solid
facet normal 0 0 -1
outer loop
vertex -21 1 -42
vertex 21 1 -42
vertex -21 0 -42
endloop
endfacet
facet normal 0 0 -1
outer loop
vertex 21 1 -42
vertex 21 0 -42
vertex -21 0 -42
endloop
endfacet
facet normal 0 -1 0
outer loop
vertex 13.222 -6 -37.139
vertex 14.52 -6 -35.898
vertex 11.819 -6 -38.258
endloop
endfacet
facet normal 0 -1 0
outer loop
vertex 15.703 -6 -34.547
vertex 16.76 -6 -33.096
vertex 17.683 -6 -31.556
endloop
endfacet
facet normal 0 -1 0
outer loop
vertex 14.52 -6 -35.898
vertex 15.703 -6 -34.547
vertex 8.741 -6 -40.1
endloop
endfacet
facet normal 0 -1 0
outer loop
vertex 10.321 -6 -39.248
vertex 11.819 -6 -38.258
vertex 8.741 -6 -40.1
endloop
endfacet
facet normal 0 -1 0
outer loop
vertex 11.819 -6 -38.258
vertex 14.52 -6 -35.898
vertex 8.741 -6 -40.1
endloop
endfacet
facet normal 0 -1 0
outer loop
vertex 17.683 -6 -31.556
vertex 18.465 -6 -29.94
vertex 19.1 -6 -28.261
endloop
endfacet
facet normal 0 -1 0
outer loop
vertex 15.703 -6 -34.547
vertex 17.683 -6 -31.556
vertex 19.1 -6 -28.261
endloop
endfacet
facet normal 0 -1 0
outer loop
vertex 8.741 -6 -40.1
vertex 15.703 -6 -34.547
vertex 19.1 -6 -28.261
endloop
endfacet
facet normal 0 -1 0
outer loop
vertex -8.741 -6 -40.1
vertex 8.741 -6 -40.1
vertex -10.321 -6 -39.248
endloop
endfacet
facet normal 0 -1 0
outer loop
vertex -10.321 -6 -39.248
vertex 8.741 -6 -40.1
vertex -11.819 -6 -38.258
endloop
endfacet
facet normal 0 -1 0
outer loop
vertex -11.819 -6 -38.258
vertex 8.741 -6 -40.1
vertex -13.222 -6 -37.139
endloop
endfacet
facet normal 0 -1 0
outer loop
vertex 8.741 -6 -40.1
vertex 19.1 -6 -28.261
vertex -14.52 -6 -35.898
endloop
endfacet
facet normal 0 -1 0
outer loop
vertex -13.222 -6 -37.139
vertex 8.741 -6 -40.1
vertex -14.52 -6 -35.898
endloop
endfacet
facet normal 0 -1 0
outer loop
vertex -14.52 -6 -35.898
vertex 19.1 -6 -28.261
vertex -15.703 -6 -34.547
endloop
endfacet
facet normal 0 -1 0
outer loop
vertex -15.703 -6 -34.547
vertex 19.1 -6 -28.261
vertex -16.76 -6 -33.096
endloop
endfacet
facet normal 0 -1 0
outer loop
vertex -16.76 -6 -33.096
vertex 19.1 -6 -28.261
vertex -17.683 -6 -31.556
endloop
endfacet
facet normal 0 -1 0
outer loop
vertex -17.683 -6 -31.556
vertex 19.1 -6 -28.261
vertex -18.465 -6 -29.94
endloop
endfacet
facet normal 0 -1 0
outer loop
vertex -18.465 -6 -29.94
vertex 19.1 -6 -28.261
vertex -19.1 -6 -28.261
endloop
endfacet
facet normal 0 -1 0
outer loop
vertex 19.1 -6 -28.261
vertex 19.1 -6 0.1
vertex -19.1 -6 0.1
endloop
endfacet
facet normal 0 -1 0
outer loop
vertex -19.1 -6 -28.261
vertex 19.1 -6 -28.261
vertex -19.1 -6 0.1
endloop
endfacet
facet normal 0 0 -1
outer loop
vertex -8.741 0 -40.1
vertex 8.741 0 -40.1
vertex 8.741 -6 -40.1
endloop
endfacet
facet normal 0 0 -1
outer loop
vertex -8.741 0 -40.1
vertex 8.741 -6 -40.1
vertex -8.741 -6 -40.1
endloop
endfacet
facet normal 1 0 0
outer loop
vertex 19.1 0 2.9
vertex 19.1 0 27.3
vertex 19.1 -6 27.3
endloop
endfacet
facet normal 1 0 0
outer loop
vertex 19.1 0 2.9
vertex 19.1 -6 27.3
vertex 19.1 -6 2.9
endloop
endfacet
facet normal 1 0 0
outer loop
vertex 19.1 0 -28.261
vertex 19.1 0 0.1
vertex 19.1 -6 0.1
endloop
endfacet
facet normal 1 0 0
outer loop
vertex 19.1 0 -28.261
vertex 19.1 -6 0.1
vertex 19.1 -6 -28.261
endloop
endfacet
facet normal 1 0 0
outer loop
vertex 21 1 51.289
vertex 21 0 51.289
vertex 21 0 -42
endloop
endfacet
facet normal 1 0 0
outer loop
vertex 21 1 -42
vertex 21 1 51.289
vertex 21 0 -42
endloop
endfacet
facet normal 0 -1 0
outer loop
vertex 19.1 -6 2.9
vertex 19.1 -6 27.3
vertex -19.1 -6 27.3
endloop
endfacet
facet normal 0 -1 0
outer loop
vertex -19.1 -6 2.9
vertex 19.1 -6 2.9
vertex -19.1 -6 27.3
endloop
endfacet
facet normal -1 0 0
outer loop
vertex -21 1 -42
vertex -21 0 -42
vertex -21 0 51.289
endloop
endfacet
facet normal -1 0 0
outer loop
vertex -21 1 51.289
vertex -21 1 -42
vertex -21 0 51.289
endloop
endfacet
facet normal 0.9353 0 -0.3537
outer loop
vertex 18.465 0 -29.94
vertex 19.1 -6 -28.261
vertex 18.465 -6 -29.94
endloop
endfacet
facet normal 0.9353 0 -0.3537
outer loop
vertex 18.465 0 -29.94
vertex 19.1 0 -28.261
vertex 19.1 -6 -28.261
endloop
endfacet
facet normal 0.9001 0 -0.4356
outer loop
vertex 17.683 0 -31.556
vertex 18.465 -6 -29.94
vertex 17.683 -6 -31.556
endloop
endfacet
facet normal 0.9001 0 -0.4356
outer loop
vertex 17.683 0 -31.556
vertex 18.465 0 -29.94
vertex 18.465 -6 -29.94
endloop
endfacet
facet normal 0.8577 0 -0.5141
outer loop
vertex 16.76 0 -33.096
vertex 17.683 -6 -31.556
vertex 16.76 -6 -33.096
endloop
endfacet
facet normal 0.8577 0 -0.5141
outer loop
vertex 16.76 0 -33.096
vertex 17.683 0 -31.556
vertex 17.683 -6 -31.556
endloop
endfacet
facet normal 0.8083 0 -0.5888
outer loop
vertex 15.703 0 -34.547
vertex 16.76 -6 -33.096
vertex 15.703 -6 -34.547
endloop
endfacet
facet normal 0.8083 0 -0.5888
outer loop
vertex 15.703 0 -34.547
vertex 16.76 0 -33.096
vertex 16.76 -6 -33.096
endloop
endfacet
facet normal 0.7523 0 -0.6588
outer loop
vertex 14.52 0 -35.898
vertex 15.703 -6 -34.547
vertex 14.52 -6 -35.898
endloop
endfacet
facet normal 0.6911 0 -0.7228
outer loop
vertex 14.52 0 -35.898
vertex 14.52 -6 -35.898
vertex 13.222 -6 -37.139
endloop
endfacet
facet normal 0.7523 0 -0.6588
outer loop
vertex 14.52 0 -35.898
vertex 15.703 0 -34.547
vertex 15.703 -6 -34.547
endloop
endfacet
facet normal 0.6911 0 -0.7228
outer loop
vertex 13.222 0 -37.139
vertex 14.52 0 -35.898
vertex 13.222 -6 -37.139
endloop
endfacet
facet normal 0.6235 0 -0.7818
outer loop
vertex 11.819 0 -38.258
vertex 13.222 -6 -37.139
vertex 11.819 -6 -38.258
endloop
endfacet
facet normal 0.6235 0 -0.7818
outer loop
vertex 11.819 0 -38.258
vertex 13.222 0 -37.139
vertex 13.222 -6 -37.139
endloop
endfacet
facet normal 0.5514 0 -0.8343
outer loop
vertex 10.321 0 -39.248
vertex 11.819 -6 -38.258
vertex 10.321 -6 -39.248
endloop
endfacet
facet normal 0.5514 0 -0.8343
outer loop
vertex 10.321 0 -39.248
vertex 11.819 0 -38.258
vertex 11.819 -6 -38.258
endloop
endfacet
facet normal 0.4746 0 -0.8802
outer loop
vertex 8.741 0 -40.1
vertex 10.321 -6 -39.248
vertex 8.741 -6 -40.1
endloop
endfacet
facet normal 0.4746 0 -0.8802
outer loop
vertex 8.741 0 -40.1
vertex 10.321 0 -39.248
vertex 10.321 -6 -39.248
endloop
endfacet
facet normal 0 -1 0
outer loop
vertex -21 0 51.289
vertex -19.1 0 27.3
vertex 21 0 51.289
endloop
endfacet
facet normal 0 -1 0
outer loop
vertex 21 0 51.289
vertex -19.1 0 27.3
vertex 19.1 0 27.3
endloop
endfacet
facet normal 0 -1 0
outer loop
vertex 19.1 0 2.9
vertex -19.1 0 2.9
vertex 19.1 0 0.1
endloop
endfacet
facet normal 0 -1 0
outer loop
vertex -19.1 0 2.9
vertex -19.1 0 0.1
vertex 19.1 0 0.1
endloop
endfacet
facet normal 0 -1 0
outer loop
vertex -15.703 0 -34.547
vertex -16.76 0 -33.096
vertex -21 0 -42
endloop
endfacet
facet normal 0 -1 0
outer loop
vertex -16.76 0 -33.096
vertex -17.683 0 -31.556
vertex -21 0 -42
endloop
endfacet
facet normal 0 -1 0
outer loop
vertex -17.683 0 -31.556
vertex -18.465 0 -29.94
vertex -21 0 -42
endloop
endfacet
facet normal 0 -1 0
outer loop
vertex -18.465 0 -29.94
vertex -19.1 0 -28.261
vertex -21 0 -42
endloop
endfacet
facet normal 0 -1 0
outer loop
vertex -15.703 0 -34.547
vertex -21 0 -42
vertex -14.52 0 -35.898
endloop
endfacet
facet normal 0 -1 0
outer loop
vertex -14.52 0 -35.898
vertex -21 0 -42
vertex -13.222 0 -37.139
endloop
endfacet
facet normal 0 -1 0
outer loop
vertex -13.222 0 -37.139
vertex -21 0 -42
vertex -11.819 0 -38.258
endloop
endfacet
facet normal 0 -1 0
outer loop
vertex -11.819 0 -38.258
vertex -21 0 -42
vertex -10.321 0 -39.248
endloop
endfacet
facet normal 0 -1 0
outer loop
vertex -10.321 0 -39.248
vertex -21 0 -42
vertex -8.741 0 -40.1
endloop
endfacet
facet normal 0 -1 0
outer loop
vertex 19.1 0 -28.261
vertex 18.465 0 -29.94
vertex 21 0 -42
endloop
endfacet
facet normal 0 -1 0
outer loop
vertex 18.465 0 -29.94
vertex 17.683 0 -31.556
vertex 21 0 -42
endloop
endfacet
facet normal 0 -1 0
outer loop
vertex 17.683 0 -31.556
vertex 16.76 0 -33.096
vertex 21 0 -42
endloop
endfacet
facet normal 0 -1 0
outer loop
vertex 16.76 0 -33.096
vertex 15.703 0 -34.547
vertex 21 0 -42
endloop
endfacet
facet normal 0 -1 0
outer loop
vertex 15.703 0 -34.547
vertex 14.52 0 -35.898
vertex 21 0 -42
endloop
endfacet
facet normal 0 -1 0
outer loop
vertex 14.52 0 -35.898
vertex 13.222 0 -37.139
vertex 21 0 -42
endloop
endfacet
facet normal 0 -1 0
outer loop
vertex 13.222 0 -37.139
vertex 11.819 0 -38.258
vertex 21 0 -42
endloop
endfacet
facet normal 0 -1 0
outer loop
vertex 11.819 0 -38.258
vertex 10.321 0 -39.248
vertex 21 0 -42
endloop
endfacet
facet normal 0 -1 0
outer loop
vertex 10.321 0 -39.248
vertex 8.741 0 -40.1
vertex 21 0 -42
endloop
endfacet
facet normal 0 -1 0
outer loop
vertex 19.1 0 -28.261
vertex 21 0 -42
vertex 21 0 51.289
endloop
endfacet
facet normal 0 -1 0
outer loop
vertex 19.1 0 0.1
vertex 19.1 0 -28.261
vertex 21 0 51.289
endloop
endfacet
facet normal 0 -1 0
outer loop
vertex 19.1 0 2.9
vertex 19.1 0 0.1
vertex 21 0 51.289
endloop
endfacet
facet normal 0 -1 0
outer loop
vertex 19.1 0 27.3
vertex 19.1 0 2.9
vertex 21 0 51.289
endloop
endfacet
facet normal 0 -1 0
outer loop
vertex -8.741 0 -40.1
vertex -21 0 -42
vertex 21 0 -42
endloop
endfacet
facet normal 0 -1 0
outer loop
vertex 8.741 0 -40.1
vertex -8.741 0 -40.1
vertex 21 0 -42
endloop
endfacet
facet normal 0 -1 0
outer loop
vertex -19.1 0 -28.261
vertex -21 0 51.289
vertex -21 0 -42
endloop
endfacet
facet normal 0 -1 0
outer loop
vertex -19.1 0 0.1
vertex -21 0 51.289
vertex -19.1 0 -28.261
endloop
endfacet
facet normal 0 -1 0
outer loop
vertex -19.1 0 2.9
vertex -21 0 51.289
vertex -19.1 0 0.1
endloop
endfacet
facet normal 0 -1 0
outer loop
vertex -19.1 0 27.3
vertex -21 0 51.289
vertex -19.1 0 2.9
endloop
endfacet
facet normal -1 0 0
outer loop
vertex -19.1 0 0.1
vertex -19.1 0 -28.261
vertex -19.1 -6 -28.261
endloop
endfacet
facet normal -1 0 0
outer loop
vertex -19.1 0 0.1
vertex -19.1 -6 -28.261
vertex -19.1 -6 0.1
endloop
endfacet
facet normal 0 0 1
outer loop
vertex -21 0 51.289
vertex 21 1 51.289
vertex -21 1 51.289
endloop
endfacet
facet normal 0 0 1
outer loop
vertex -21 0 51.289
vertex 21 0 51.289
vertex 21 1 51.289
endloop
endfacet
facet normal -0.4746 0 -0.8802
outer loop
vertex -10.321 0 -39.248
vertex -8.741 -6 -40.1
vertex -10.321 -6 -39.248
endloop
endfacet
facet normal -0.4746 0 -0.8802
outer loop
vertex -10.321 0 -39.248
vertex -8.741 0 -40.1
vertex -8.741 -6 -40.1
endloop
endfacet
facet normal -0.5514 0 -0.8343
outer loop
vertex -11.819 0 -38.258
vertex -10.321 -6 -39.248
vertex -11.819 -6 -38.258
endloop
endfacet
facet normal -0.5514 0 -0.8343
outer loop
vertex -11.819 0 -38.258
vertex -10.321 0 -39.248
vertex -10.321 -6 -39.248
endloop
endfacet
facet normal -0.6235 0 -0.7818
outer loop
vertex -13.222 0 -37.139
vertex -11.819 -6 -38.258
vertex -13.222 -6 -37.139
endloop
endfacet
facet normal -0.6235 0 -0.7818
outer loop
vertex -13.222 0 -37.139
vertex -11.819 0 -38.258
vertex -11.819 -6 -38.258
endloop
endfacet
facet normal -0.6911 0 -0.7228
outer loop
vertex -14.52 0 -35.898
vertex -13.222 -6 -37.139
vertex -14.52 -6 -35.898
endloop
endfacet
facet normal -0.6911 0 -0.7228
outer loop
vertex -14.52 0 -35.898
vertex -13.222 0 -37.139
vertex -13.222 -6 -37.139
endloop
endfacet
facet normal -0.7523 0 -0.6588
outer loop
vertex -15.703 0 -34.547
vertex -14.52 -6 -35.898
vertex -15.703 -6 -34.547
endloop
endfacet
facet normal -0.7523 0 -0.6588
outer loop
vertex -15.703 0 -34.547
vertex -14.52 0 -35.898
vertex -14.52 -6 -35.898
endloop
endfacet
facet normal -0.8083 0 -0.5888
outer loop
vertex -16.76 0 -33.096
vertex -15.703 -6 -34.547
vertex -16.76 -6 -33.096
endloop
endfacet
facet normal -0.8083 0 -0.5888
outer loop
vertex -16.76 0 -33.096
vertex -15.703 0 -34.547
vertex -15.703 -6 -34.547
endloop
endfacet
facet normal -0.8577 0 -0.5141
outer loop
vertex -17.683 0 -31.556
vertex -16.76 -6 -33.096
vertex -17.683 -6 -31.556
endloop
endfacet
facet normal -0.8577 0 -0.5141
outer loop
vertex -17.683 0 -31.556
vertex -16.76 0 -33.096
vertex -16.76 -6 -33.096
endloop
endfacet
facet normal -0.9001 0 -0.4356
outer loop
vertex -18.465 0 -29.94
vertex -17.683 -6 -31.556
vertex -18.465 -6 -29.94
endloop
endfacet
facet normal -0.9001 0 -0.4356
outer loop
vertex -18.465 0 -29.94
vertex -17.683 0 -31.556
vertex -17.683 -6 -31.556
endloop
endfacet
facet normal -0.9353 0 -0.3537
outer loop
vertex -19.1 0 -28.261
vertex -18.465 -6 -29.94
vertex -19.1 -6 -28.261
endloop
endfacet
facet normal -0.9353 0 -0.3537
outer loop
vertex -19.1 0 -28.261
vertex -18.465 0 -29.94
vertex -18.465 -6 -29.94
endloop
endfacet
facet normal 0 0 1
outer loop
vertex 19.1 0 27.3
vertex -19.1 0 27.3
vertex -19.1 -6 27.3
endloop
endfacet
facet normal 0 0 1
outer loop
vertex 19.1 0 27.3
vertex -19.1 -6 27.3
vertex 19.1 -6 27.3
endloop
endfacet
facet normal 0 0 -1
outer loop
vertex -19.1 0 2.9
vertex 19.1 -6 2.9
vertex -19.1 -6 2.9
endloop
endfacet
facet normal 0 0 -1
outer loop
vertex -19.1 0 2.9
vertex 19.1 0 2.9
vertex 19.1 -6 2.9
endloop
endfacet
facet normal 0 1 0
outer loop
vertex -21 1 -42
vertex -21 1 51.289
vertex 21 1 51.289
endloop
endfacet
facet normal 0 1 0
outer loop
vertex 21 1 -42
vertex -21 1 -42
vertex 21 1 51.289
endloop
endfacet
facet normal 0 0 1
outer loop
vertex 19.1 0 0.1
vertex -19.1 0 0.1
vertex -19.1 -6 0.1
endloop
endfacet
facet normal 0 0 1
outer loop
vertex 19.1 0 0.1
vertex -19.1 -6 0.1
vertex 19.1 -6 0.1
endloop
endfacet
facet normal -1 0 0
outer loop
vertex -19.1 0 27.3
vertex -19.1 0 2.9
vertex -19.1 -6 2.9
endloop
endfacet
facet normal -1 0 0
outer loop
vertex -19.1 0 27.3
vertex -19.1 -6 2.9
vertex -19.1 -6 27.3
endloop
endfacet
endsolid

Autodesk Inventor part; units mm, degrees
ref_plane "YZ Plane" through (0, 0, 0) normal (1, 0, 0) x (0, 1, 0)
ref_plane "XZ Plane" through (0, 0, 0) normal (0, 1, 0) x (-1, 0, 0)
ref_plane "XY Plane" through (0, 0, 0) normal (0, 0, 1) x (1, 0, 0)
sketch "スケッチ1" plane through (0, 0, 0) normal (0, 1, 0) x (-1, 0, 0)
  line L0 (-21, 51.2893) -> (-21, -42) projected
  line L1 (-21, -42) -> (21, -42) projected
  line L2 (21, -42) -> (21, 51.2893) projected
  line L3 (-21, 51.2893) -> (21, 51.2893) projected
  line L4 (-19.7, 0.7) -> (19.7, 0.7) projected
  line L5 (19.7, 0.7) -> (19.7, -28.3561) projected
  arc A0 (8.8769, -40.7) -> (19.7, -28.3561) centre (0, -22) ccw projected
  line L6 (8.8769, -40.7) -> (-8.8769, -40.7) projected
  arc A1 (-19.7, -28.3561) -> (-8.8769, -40.7) centre (0, -22) ccw projected
  line L7 (-19.7, -28.3561) -> (-19.7, 0.7) projected
  line L8 (-19.7, 2.3) -> (-19.7, 33.1604) projected
  ellipse E0 centre (-12, 33.1604) end of major axis (-12, 25.3416) minor radius 7.7 (-19.3049, 35.6329) -> (-19.7, 33.1604) ccw projected
  line L9 (-16.2595, 44.9098) -> (-19.3049, 35.6329) projected
  ellipse E1 centre (-8.9547, 42.4373) end of major axis (-8.9547, 34.6185) minor radius 7.7 (-8.9547, 50.2561) -> (-16.2595, 44.9098) ccw projected
  line L10 (8.9547, 50.2561) -> (-8.9547, 50.2561) projected
  ellipse E2 centre (8.9547, 42.4373) end of major axis (8.9547, 34.6185) minor radius 7.7 (16.2595, 44.9098) -> (8.9547, 50.2561) ccw projected
  line L11 (19.3049, 35.6329) -> (16.2595, 44.9098) projected
  ellipse E3 centre (12, 33.1604) end of major axis (12, 25.3416) minor radius 7.7 (19.7, 33.1604) -> (19.3049, 35.6329) ccw projected
  line L12 (19.7, 33.1604) -> (19.7, 2.3) projected
  line L13 (19.7, 2.3) -> (-19.7, 2.3) projected
  line L14 (8.9547, 49.6561) -> (-8.9547, 49.6561)
  line L15 (-15.6895, 44.7227) -> (-18.7348, 35.4458)
  line L16 (-19.1, 33.1604) -> (-19.1, 2.9)
  line L17 (-19.1, 2.9) -> (19.1, 2.9)
  line L18 (19.1, 2.9) -> (19.1, 33.1604)
  line L19 (18.7348, 35.4458) -> (15.6895, 44.7227)
  line L20 (19.1, -28.261) -> (19.1, 0.1)
  line L21 (19.1, 0.1) -> (-19.1, 0.1)
  line L22 (-19.1, 0.1) -> (-19.1, -28.261)
  arc A2 (-19.1, -28.261) -> (-8.7407, -40.1) centre (0, -22) ccw
  line L23 (-8.7407, -40.1) -> (8.7407, -40.1)
  arc A3 (8.7407, -40.1) -> (19.1, -28.261) centre (0, -22) ccw
  line L24 (19.1, 27.3) -> (-19.1, 27.3)
  point P0 (0, 0)
  dimension "d0" = 0.6
  dimension "d1" = 0.6
  dimension "d2" = 25
extrude "押し出し1" add sketch "スケッチ1" against normal blind 6 contours L24 L18 L17 L16 | A3 L23 A2 L22 L21 L20
sketch "スケッチ2" plane through (0, 0, 0) normal (0, 1, 0) x (1, 0, 0)
  line L0 (21, -51.2893) -> (21, 42) projected
  line L1 (21, 42) -> (-21, 42) projected
  line L2 (-21, 42) -> (-21, -51.2893) projected
  line L3 (21, -51.2893) -> (-21, -51.2893) projected
  line L4 (19.7, -0.7) -> (-19.7, -0.7) projected
  line L5 (-19.7, -0.7) -> (-19.7, 28.3561) projected
  arc A0 (-8.8769, 40.7) -> (-19.7, 28.3561) centre (0, 22) ccw projected
  line L6 (-8.8769, 40.7) -> (8.8769, 40.7) projected
  arc A1 (19.7, 28.3561) -> (8.8769, 40.7) centre (0, 22) ccw projected
  line L7 (19.7, 28.3561) -> (19.7, -0.7) projected
  line L8 (19.7, -2.3) -> (19.7, -33.1604) projected
  ellipse E0 centre (12, -33.1604) end of major axis (12, -25.3416) minor radius 7.7 (19.3049, -35.6329) -> (19.7, -33.1604) ccw projected
  line L9 (16.2595, -44.9098) -> (19.3049, -35.6329) projected
  ellipse E1 centre (8.9547, -42.4373) end of major axis (8.9547, -34.6185) minor radius 7.7 (8.9547, -50.2561) -> (16.2595, -44.9098) ccw projected
  line L10 (-8.9547, -50.2561) -> (8.9547, -50.2561) projected
  ellipse E2 centre (-8.9547, -42.4373) end of major axis (-8.9547, -34.6185) minor radius 7.7 (-16.2595, -44.9098) -> (-8.9547, -50.2561) ccw projected
  line L11 (-19.3049, -35.6329) -> (-16.2595, -44.9098) projected
  ellipse E3 centre (-12, -33.1604) end of major axis (-12, -25.3416) minor radius 7.7 (-19.7, -33.1604) -> (-19.3049, -35.6329) ccw projected
  line L12 (-19.7, -33.1604) -> (-19.7, -2.3) projected
  line L13 (-19.7, -2.3) -> (19.7, -2.3) projected
  point P0 (0, 0)
extrude "押し出し2" add sketch "スケッチ2" along normal blind 1 contours L3 L2 L1 L0 | L4 L5 A0 L6 A1 L7 | L8 E0 L9 E1 L10 E2 L11 E3 L12 L13
properties part number "sole_paint_support_base"
